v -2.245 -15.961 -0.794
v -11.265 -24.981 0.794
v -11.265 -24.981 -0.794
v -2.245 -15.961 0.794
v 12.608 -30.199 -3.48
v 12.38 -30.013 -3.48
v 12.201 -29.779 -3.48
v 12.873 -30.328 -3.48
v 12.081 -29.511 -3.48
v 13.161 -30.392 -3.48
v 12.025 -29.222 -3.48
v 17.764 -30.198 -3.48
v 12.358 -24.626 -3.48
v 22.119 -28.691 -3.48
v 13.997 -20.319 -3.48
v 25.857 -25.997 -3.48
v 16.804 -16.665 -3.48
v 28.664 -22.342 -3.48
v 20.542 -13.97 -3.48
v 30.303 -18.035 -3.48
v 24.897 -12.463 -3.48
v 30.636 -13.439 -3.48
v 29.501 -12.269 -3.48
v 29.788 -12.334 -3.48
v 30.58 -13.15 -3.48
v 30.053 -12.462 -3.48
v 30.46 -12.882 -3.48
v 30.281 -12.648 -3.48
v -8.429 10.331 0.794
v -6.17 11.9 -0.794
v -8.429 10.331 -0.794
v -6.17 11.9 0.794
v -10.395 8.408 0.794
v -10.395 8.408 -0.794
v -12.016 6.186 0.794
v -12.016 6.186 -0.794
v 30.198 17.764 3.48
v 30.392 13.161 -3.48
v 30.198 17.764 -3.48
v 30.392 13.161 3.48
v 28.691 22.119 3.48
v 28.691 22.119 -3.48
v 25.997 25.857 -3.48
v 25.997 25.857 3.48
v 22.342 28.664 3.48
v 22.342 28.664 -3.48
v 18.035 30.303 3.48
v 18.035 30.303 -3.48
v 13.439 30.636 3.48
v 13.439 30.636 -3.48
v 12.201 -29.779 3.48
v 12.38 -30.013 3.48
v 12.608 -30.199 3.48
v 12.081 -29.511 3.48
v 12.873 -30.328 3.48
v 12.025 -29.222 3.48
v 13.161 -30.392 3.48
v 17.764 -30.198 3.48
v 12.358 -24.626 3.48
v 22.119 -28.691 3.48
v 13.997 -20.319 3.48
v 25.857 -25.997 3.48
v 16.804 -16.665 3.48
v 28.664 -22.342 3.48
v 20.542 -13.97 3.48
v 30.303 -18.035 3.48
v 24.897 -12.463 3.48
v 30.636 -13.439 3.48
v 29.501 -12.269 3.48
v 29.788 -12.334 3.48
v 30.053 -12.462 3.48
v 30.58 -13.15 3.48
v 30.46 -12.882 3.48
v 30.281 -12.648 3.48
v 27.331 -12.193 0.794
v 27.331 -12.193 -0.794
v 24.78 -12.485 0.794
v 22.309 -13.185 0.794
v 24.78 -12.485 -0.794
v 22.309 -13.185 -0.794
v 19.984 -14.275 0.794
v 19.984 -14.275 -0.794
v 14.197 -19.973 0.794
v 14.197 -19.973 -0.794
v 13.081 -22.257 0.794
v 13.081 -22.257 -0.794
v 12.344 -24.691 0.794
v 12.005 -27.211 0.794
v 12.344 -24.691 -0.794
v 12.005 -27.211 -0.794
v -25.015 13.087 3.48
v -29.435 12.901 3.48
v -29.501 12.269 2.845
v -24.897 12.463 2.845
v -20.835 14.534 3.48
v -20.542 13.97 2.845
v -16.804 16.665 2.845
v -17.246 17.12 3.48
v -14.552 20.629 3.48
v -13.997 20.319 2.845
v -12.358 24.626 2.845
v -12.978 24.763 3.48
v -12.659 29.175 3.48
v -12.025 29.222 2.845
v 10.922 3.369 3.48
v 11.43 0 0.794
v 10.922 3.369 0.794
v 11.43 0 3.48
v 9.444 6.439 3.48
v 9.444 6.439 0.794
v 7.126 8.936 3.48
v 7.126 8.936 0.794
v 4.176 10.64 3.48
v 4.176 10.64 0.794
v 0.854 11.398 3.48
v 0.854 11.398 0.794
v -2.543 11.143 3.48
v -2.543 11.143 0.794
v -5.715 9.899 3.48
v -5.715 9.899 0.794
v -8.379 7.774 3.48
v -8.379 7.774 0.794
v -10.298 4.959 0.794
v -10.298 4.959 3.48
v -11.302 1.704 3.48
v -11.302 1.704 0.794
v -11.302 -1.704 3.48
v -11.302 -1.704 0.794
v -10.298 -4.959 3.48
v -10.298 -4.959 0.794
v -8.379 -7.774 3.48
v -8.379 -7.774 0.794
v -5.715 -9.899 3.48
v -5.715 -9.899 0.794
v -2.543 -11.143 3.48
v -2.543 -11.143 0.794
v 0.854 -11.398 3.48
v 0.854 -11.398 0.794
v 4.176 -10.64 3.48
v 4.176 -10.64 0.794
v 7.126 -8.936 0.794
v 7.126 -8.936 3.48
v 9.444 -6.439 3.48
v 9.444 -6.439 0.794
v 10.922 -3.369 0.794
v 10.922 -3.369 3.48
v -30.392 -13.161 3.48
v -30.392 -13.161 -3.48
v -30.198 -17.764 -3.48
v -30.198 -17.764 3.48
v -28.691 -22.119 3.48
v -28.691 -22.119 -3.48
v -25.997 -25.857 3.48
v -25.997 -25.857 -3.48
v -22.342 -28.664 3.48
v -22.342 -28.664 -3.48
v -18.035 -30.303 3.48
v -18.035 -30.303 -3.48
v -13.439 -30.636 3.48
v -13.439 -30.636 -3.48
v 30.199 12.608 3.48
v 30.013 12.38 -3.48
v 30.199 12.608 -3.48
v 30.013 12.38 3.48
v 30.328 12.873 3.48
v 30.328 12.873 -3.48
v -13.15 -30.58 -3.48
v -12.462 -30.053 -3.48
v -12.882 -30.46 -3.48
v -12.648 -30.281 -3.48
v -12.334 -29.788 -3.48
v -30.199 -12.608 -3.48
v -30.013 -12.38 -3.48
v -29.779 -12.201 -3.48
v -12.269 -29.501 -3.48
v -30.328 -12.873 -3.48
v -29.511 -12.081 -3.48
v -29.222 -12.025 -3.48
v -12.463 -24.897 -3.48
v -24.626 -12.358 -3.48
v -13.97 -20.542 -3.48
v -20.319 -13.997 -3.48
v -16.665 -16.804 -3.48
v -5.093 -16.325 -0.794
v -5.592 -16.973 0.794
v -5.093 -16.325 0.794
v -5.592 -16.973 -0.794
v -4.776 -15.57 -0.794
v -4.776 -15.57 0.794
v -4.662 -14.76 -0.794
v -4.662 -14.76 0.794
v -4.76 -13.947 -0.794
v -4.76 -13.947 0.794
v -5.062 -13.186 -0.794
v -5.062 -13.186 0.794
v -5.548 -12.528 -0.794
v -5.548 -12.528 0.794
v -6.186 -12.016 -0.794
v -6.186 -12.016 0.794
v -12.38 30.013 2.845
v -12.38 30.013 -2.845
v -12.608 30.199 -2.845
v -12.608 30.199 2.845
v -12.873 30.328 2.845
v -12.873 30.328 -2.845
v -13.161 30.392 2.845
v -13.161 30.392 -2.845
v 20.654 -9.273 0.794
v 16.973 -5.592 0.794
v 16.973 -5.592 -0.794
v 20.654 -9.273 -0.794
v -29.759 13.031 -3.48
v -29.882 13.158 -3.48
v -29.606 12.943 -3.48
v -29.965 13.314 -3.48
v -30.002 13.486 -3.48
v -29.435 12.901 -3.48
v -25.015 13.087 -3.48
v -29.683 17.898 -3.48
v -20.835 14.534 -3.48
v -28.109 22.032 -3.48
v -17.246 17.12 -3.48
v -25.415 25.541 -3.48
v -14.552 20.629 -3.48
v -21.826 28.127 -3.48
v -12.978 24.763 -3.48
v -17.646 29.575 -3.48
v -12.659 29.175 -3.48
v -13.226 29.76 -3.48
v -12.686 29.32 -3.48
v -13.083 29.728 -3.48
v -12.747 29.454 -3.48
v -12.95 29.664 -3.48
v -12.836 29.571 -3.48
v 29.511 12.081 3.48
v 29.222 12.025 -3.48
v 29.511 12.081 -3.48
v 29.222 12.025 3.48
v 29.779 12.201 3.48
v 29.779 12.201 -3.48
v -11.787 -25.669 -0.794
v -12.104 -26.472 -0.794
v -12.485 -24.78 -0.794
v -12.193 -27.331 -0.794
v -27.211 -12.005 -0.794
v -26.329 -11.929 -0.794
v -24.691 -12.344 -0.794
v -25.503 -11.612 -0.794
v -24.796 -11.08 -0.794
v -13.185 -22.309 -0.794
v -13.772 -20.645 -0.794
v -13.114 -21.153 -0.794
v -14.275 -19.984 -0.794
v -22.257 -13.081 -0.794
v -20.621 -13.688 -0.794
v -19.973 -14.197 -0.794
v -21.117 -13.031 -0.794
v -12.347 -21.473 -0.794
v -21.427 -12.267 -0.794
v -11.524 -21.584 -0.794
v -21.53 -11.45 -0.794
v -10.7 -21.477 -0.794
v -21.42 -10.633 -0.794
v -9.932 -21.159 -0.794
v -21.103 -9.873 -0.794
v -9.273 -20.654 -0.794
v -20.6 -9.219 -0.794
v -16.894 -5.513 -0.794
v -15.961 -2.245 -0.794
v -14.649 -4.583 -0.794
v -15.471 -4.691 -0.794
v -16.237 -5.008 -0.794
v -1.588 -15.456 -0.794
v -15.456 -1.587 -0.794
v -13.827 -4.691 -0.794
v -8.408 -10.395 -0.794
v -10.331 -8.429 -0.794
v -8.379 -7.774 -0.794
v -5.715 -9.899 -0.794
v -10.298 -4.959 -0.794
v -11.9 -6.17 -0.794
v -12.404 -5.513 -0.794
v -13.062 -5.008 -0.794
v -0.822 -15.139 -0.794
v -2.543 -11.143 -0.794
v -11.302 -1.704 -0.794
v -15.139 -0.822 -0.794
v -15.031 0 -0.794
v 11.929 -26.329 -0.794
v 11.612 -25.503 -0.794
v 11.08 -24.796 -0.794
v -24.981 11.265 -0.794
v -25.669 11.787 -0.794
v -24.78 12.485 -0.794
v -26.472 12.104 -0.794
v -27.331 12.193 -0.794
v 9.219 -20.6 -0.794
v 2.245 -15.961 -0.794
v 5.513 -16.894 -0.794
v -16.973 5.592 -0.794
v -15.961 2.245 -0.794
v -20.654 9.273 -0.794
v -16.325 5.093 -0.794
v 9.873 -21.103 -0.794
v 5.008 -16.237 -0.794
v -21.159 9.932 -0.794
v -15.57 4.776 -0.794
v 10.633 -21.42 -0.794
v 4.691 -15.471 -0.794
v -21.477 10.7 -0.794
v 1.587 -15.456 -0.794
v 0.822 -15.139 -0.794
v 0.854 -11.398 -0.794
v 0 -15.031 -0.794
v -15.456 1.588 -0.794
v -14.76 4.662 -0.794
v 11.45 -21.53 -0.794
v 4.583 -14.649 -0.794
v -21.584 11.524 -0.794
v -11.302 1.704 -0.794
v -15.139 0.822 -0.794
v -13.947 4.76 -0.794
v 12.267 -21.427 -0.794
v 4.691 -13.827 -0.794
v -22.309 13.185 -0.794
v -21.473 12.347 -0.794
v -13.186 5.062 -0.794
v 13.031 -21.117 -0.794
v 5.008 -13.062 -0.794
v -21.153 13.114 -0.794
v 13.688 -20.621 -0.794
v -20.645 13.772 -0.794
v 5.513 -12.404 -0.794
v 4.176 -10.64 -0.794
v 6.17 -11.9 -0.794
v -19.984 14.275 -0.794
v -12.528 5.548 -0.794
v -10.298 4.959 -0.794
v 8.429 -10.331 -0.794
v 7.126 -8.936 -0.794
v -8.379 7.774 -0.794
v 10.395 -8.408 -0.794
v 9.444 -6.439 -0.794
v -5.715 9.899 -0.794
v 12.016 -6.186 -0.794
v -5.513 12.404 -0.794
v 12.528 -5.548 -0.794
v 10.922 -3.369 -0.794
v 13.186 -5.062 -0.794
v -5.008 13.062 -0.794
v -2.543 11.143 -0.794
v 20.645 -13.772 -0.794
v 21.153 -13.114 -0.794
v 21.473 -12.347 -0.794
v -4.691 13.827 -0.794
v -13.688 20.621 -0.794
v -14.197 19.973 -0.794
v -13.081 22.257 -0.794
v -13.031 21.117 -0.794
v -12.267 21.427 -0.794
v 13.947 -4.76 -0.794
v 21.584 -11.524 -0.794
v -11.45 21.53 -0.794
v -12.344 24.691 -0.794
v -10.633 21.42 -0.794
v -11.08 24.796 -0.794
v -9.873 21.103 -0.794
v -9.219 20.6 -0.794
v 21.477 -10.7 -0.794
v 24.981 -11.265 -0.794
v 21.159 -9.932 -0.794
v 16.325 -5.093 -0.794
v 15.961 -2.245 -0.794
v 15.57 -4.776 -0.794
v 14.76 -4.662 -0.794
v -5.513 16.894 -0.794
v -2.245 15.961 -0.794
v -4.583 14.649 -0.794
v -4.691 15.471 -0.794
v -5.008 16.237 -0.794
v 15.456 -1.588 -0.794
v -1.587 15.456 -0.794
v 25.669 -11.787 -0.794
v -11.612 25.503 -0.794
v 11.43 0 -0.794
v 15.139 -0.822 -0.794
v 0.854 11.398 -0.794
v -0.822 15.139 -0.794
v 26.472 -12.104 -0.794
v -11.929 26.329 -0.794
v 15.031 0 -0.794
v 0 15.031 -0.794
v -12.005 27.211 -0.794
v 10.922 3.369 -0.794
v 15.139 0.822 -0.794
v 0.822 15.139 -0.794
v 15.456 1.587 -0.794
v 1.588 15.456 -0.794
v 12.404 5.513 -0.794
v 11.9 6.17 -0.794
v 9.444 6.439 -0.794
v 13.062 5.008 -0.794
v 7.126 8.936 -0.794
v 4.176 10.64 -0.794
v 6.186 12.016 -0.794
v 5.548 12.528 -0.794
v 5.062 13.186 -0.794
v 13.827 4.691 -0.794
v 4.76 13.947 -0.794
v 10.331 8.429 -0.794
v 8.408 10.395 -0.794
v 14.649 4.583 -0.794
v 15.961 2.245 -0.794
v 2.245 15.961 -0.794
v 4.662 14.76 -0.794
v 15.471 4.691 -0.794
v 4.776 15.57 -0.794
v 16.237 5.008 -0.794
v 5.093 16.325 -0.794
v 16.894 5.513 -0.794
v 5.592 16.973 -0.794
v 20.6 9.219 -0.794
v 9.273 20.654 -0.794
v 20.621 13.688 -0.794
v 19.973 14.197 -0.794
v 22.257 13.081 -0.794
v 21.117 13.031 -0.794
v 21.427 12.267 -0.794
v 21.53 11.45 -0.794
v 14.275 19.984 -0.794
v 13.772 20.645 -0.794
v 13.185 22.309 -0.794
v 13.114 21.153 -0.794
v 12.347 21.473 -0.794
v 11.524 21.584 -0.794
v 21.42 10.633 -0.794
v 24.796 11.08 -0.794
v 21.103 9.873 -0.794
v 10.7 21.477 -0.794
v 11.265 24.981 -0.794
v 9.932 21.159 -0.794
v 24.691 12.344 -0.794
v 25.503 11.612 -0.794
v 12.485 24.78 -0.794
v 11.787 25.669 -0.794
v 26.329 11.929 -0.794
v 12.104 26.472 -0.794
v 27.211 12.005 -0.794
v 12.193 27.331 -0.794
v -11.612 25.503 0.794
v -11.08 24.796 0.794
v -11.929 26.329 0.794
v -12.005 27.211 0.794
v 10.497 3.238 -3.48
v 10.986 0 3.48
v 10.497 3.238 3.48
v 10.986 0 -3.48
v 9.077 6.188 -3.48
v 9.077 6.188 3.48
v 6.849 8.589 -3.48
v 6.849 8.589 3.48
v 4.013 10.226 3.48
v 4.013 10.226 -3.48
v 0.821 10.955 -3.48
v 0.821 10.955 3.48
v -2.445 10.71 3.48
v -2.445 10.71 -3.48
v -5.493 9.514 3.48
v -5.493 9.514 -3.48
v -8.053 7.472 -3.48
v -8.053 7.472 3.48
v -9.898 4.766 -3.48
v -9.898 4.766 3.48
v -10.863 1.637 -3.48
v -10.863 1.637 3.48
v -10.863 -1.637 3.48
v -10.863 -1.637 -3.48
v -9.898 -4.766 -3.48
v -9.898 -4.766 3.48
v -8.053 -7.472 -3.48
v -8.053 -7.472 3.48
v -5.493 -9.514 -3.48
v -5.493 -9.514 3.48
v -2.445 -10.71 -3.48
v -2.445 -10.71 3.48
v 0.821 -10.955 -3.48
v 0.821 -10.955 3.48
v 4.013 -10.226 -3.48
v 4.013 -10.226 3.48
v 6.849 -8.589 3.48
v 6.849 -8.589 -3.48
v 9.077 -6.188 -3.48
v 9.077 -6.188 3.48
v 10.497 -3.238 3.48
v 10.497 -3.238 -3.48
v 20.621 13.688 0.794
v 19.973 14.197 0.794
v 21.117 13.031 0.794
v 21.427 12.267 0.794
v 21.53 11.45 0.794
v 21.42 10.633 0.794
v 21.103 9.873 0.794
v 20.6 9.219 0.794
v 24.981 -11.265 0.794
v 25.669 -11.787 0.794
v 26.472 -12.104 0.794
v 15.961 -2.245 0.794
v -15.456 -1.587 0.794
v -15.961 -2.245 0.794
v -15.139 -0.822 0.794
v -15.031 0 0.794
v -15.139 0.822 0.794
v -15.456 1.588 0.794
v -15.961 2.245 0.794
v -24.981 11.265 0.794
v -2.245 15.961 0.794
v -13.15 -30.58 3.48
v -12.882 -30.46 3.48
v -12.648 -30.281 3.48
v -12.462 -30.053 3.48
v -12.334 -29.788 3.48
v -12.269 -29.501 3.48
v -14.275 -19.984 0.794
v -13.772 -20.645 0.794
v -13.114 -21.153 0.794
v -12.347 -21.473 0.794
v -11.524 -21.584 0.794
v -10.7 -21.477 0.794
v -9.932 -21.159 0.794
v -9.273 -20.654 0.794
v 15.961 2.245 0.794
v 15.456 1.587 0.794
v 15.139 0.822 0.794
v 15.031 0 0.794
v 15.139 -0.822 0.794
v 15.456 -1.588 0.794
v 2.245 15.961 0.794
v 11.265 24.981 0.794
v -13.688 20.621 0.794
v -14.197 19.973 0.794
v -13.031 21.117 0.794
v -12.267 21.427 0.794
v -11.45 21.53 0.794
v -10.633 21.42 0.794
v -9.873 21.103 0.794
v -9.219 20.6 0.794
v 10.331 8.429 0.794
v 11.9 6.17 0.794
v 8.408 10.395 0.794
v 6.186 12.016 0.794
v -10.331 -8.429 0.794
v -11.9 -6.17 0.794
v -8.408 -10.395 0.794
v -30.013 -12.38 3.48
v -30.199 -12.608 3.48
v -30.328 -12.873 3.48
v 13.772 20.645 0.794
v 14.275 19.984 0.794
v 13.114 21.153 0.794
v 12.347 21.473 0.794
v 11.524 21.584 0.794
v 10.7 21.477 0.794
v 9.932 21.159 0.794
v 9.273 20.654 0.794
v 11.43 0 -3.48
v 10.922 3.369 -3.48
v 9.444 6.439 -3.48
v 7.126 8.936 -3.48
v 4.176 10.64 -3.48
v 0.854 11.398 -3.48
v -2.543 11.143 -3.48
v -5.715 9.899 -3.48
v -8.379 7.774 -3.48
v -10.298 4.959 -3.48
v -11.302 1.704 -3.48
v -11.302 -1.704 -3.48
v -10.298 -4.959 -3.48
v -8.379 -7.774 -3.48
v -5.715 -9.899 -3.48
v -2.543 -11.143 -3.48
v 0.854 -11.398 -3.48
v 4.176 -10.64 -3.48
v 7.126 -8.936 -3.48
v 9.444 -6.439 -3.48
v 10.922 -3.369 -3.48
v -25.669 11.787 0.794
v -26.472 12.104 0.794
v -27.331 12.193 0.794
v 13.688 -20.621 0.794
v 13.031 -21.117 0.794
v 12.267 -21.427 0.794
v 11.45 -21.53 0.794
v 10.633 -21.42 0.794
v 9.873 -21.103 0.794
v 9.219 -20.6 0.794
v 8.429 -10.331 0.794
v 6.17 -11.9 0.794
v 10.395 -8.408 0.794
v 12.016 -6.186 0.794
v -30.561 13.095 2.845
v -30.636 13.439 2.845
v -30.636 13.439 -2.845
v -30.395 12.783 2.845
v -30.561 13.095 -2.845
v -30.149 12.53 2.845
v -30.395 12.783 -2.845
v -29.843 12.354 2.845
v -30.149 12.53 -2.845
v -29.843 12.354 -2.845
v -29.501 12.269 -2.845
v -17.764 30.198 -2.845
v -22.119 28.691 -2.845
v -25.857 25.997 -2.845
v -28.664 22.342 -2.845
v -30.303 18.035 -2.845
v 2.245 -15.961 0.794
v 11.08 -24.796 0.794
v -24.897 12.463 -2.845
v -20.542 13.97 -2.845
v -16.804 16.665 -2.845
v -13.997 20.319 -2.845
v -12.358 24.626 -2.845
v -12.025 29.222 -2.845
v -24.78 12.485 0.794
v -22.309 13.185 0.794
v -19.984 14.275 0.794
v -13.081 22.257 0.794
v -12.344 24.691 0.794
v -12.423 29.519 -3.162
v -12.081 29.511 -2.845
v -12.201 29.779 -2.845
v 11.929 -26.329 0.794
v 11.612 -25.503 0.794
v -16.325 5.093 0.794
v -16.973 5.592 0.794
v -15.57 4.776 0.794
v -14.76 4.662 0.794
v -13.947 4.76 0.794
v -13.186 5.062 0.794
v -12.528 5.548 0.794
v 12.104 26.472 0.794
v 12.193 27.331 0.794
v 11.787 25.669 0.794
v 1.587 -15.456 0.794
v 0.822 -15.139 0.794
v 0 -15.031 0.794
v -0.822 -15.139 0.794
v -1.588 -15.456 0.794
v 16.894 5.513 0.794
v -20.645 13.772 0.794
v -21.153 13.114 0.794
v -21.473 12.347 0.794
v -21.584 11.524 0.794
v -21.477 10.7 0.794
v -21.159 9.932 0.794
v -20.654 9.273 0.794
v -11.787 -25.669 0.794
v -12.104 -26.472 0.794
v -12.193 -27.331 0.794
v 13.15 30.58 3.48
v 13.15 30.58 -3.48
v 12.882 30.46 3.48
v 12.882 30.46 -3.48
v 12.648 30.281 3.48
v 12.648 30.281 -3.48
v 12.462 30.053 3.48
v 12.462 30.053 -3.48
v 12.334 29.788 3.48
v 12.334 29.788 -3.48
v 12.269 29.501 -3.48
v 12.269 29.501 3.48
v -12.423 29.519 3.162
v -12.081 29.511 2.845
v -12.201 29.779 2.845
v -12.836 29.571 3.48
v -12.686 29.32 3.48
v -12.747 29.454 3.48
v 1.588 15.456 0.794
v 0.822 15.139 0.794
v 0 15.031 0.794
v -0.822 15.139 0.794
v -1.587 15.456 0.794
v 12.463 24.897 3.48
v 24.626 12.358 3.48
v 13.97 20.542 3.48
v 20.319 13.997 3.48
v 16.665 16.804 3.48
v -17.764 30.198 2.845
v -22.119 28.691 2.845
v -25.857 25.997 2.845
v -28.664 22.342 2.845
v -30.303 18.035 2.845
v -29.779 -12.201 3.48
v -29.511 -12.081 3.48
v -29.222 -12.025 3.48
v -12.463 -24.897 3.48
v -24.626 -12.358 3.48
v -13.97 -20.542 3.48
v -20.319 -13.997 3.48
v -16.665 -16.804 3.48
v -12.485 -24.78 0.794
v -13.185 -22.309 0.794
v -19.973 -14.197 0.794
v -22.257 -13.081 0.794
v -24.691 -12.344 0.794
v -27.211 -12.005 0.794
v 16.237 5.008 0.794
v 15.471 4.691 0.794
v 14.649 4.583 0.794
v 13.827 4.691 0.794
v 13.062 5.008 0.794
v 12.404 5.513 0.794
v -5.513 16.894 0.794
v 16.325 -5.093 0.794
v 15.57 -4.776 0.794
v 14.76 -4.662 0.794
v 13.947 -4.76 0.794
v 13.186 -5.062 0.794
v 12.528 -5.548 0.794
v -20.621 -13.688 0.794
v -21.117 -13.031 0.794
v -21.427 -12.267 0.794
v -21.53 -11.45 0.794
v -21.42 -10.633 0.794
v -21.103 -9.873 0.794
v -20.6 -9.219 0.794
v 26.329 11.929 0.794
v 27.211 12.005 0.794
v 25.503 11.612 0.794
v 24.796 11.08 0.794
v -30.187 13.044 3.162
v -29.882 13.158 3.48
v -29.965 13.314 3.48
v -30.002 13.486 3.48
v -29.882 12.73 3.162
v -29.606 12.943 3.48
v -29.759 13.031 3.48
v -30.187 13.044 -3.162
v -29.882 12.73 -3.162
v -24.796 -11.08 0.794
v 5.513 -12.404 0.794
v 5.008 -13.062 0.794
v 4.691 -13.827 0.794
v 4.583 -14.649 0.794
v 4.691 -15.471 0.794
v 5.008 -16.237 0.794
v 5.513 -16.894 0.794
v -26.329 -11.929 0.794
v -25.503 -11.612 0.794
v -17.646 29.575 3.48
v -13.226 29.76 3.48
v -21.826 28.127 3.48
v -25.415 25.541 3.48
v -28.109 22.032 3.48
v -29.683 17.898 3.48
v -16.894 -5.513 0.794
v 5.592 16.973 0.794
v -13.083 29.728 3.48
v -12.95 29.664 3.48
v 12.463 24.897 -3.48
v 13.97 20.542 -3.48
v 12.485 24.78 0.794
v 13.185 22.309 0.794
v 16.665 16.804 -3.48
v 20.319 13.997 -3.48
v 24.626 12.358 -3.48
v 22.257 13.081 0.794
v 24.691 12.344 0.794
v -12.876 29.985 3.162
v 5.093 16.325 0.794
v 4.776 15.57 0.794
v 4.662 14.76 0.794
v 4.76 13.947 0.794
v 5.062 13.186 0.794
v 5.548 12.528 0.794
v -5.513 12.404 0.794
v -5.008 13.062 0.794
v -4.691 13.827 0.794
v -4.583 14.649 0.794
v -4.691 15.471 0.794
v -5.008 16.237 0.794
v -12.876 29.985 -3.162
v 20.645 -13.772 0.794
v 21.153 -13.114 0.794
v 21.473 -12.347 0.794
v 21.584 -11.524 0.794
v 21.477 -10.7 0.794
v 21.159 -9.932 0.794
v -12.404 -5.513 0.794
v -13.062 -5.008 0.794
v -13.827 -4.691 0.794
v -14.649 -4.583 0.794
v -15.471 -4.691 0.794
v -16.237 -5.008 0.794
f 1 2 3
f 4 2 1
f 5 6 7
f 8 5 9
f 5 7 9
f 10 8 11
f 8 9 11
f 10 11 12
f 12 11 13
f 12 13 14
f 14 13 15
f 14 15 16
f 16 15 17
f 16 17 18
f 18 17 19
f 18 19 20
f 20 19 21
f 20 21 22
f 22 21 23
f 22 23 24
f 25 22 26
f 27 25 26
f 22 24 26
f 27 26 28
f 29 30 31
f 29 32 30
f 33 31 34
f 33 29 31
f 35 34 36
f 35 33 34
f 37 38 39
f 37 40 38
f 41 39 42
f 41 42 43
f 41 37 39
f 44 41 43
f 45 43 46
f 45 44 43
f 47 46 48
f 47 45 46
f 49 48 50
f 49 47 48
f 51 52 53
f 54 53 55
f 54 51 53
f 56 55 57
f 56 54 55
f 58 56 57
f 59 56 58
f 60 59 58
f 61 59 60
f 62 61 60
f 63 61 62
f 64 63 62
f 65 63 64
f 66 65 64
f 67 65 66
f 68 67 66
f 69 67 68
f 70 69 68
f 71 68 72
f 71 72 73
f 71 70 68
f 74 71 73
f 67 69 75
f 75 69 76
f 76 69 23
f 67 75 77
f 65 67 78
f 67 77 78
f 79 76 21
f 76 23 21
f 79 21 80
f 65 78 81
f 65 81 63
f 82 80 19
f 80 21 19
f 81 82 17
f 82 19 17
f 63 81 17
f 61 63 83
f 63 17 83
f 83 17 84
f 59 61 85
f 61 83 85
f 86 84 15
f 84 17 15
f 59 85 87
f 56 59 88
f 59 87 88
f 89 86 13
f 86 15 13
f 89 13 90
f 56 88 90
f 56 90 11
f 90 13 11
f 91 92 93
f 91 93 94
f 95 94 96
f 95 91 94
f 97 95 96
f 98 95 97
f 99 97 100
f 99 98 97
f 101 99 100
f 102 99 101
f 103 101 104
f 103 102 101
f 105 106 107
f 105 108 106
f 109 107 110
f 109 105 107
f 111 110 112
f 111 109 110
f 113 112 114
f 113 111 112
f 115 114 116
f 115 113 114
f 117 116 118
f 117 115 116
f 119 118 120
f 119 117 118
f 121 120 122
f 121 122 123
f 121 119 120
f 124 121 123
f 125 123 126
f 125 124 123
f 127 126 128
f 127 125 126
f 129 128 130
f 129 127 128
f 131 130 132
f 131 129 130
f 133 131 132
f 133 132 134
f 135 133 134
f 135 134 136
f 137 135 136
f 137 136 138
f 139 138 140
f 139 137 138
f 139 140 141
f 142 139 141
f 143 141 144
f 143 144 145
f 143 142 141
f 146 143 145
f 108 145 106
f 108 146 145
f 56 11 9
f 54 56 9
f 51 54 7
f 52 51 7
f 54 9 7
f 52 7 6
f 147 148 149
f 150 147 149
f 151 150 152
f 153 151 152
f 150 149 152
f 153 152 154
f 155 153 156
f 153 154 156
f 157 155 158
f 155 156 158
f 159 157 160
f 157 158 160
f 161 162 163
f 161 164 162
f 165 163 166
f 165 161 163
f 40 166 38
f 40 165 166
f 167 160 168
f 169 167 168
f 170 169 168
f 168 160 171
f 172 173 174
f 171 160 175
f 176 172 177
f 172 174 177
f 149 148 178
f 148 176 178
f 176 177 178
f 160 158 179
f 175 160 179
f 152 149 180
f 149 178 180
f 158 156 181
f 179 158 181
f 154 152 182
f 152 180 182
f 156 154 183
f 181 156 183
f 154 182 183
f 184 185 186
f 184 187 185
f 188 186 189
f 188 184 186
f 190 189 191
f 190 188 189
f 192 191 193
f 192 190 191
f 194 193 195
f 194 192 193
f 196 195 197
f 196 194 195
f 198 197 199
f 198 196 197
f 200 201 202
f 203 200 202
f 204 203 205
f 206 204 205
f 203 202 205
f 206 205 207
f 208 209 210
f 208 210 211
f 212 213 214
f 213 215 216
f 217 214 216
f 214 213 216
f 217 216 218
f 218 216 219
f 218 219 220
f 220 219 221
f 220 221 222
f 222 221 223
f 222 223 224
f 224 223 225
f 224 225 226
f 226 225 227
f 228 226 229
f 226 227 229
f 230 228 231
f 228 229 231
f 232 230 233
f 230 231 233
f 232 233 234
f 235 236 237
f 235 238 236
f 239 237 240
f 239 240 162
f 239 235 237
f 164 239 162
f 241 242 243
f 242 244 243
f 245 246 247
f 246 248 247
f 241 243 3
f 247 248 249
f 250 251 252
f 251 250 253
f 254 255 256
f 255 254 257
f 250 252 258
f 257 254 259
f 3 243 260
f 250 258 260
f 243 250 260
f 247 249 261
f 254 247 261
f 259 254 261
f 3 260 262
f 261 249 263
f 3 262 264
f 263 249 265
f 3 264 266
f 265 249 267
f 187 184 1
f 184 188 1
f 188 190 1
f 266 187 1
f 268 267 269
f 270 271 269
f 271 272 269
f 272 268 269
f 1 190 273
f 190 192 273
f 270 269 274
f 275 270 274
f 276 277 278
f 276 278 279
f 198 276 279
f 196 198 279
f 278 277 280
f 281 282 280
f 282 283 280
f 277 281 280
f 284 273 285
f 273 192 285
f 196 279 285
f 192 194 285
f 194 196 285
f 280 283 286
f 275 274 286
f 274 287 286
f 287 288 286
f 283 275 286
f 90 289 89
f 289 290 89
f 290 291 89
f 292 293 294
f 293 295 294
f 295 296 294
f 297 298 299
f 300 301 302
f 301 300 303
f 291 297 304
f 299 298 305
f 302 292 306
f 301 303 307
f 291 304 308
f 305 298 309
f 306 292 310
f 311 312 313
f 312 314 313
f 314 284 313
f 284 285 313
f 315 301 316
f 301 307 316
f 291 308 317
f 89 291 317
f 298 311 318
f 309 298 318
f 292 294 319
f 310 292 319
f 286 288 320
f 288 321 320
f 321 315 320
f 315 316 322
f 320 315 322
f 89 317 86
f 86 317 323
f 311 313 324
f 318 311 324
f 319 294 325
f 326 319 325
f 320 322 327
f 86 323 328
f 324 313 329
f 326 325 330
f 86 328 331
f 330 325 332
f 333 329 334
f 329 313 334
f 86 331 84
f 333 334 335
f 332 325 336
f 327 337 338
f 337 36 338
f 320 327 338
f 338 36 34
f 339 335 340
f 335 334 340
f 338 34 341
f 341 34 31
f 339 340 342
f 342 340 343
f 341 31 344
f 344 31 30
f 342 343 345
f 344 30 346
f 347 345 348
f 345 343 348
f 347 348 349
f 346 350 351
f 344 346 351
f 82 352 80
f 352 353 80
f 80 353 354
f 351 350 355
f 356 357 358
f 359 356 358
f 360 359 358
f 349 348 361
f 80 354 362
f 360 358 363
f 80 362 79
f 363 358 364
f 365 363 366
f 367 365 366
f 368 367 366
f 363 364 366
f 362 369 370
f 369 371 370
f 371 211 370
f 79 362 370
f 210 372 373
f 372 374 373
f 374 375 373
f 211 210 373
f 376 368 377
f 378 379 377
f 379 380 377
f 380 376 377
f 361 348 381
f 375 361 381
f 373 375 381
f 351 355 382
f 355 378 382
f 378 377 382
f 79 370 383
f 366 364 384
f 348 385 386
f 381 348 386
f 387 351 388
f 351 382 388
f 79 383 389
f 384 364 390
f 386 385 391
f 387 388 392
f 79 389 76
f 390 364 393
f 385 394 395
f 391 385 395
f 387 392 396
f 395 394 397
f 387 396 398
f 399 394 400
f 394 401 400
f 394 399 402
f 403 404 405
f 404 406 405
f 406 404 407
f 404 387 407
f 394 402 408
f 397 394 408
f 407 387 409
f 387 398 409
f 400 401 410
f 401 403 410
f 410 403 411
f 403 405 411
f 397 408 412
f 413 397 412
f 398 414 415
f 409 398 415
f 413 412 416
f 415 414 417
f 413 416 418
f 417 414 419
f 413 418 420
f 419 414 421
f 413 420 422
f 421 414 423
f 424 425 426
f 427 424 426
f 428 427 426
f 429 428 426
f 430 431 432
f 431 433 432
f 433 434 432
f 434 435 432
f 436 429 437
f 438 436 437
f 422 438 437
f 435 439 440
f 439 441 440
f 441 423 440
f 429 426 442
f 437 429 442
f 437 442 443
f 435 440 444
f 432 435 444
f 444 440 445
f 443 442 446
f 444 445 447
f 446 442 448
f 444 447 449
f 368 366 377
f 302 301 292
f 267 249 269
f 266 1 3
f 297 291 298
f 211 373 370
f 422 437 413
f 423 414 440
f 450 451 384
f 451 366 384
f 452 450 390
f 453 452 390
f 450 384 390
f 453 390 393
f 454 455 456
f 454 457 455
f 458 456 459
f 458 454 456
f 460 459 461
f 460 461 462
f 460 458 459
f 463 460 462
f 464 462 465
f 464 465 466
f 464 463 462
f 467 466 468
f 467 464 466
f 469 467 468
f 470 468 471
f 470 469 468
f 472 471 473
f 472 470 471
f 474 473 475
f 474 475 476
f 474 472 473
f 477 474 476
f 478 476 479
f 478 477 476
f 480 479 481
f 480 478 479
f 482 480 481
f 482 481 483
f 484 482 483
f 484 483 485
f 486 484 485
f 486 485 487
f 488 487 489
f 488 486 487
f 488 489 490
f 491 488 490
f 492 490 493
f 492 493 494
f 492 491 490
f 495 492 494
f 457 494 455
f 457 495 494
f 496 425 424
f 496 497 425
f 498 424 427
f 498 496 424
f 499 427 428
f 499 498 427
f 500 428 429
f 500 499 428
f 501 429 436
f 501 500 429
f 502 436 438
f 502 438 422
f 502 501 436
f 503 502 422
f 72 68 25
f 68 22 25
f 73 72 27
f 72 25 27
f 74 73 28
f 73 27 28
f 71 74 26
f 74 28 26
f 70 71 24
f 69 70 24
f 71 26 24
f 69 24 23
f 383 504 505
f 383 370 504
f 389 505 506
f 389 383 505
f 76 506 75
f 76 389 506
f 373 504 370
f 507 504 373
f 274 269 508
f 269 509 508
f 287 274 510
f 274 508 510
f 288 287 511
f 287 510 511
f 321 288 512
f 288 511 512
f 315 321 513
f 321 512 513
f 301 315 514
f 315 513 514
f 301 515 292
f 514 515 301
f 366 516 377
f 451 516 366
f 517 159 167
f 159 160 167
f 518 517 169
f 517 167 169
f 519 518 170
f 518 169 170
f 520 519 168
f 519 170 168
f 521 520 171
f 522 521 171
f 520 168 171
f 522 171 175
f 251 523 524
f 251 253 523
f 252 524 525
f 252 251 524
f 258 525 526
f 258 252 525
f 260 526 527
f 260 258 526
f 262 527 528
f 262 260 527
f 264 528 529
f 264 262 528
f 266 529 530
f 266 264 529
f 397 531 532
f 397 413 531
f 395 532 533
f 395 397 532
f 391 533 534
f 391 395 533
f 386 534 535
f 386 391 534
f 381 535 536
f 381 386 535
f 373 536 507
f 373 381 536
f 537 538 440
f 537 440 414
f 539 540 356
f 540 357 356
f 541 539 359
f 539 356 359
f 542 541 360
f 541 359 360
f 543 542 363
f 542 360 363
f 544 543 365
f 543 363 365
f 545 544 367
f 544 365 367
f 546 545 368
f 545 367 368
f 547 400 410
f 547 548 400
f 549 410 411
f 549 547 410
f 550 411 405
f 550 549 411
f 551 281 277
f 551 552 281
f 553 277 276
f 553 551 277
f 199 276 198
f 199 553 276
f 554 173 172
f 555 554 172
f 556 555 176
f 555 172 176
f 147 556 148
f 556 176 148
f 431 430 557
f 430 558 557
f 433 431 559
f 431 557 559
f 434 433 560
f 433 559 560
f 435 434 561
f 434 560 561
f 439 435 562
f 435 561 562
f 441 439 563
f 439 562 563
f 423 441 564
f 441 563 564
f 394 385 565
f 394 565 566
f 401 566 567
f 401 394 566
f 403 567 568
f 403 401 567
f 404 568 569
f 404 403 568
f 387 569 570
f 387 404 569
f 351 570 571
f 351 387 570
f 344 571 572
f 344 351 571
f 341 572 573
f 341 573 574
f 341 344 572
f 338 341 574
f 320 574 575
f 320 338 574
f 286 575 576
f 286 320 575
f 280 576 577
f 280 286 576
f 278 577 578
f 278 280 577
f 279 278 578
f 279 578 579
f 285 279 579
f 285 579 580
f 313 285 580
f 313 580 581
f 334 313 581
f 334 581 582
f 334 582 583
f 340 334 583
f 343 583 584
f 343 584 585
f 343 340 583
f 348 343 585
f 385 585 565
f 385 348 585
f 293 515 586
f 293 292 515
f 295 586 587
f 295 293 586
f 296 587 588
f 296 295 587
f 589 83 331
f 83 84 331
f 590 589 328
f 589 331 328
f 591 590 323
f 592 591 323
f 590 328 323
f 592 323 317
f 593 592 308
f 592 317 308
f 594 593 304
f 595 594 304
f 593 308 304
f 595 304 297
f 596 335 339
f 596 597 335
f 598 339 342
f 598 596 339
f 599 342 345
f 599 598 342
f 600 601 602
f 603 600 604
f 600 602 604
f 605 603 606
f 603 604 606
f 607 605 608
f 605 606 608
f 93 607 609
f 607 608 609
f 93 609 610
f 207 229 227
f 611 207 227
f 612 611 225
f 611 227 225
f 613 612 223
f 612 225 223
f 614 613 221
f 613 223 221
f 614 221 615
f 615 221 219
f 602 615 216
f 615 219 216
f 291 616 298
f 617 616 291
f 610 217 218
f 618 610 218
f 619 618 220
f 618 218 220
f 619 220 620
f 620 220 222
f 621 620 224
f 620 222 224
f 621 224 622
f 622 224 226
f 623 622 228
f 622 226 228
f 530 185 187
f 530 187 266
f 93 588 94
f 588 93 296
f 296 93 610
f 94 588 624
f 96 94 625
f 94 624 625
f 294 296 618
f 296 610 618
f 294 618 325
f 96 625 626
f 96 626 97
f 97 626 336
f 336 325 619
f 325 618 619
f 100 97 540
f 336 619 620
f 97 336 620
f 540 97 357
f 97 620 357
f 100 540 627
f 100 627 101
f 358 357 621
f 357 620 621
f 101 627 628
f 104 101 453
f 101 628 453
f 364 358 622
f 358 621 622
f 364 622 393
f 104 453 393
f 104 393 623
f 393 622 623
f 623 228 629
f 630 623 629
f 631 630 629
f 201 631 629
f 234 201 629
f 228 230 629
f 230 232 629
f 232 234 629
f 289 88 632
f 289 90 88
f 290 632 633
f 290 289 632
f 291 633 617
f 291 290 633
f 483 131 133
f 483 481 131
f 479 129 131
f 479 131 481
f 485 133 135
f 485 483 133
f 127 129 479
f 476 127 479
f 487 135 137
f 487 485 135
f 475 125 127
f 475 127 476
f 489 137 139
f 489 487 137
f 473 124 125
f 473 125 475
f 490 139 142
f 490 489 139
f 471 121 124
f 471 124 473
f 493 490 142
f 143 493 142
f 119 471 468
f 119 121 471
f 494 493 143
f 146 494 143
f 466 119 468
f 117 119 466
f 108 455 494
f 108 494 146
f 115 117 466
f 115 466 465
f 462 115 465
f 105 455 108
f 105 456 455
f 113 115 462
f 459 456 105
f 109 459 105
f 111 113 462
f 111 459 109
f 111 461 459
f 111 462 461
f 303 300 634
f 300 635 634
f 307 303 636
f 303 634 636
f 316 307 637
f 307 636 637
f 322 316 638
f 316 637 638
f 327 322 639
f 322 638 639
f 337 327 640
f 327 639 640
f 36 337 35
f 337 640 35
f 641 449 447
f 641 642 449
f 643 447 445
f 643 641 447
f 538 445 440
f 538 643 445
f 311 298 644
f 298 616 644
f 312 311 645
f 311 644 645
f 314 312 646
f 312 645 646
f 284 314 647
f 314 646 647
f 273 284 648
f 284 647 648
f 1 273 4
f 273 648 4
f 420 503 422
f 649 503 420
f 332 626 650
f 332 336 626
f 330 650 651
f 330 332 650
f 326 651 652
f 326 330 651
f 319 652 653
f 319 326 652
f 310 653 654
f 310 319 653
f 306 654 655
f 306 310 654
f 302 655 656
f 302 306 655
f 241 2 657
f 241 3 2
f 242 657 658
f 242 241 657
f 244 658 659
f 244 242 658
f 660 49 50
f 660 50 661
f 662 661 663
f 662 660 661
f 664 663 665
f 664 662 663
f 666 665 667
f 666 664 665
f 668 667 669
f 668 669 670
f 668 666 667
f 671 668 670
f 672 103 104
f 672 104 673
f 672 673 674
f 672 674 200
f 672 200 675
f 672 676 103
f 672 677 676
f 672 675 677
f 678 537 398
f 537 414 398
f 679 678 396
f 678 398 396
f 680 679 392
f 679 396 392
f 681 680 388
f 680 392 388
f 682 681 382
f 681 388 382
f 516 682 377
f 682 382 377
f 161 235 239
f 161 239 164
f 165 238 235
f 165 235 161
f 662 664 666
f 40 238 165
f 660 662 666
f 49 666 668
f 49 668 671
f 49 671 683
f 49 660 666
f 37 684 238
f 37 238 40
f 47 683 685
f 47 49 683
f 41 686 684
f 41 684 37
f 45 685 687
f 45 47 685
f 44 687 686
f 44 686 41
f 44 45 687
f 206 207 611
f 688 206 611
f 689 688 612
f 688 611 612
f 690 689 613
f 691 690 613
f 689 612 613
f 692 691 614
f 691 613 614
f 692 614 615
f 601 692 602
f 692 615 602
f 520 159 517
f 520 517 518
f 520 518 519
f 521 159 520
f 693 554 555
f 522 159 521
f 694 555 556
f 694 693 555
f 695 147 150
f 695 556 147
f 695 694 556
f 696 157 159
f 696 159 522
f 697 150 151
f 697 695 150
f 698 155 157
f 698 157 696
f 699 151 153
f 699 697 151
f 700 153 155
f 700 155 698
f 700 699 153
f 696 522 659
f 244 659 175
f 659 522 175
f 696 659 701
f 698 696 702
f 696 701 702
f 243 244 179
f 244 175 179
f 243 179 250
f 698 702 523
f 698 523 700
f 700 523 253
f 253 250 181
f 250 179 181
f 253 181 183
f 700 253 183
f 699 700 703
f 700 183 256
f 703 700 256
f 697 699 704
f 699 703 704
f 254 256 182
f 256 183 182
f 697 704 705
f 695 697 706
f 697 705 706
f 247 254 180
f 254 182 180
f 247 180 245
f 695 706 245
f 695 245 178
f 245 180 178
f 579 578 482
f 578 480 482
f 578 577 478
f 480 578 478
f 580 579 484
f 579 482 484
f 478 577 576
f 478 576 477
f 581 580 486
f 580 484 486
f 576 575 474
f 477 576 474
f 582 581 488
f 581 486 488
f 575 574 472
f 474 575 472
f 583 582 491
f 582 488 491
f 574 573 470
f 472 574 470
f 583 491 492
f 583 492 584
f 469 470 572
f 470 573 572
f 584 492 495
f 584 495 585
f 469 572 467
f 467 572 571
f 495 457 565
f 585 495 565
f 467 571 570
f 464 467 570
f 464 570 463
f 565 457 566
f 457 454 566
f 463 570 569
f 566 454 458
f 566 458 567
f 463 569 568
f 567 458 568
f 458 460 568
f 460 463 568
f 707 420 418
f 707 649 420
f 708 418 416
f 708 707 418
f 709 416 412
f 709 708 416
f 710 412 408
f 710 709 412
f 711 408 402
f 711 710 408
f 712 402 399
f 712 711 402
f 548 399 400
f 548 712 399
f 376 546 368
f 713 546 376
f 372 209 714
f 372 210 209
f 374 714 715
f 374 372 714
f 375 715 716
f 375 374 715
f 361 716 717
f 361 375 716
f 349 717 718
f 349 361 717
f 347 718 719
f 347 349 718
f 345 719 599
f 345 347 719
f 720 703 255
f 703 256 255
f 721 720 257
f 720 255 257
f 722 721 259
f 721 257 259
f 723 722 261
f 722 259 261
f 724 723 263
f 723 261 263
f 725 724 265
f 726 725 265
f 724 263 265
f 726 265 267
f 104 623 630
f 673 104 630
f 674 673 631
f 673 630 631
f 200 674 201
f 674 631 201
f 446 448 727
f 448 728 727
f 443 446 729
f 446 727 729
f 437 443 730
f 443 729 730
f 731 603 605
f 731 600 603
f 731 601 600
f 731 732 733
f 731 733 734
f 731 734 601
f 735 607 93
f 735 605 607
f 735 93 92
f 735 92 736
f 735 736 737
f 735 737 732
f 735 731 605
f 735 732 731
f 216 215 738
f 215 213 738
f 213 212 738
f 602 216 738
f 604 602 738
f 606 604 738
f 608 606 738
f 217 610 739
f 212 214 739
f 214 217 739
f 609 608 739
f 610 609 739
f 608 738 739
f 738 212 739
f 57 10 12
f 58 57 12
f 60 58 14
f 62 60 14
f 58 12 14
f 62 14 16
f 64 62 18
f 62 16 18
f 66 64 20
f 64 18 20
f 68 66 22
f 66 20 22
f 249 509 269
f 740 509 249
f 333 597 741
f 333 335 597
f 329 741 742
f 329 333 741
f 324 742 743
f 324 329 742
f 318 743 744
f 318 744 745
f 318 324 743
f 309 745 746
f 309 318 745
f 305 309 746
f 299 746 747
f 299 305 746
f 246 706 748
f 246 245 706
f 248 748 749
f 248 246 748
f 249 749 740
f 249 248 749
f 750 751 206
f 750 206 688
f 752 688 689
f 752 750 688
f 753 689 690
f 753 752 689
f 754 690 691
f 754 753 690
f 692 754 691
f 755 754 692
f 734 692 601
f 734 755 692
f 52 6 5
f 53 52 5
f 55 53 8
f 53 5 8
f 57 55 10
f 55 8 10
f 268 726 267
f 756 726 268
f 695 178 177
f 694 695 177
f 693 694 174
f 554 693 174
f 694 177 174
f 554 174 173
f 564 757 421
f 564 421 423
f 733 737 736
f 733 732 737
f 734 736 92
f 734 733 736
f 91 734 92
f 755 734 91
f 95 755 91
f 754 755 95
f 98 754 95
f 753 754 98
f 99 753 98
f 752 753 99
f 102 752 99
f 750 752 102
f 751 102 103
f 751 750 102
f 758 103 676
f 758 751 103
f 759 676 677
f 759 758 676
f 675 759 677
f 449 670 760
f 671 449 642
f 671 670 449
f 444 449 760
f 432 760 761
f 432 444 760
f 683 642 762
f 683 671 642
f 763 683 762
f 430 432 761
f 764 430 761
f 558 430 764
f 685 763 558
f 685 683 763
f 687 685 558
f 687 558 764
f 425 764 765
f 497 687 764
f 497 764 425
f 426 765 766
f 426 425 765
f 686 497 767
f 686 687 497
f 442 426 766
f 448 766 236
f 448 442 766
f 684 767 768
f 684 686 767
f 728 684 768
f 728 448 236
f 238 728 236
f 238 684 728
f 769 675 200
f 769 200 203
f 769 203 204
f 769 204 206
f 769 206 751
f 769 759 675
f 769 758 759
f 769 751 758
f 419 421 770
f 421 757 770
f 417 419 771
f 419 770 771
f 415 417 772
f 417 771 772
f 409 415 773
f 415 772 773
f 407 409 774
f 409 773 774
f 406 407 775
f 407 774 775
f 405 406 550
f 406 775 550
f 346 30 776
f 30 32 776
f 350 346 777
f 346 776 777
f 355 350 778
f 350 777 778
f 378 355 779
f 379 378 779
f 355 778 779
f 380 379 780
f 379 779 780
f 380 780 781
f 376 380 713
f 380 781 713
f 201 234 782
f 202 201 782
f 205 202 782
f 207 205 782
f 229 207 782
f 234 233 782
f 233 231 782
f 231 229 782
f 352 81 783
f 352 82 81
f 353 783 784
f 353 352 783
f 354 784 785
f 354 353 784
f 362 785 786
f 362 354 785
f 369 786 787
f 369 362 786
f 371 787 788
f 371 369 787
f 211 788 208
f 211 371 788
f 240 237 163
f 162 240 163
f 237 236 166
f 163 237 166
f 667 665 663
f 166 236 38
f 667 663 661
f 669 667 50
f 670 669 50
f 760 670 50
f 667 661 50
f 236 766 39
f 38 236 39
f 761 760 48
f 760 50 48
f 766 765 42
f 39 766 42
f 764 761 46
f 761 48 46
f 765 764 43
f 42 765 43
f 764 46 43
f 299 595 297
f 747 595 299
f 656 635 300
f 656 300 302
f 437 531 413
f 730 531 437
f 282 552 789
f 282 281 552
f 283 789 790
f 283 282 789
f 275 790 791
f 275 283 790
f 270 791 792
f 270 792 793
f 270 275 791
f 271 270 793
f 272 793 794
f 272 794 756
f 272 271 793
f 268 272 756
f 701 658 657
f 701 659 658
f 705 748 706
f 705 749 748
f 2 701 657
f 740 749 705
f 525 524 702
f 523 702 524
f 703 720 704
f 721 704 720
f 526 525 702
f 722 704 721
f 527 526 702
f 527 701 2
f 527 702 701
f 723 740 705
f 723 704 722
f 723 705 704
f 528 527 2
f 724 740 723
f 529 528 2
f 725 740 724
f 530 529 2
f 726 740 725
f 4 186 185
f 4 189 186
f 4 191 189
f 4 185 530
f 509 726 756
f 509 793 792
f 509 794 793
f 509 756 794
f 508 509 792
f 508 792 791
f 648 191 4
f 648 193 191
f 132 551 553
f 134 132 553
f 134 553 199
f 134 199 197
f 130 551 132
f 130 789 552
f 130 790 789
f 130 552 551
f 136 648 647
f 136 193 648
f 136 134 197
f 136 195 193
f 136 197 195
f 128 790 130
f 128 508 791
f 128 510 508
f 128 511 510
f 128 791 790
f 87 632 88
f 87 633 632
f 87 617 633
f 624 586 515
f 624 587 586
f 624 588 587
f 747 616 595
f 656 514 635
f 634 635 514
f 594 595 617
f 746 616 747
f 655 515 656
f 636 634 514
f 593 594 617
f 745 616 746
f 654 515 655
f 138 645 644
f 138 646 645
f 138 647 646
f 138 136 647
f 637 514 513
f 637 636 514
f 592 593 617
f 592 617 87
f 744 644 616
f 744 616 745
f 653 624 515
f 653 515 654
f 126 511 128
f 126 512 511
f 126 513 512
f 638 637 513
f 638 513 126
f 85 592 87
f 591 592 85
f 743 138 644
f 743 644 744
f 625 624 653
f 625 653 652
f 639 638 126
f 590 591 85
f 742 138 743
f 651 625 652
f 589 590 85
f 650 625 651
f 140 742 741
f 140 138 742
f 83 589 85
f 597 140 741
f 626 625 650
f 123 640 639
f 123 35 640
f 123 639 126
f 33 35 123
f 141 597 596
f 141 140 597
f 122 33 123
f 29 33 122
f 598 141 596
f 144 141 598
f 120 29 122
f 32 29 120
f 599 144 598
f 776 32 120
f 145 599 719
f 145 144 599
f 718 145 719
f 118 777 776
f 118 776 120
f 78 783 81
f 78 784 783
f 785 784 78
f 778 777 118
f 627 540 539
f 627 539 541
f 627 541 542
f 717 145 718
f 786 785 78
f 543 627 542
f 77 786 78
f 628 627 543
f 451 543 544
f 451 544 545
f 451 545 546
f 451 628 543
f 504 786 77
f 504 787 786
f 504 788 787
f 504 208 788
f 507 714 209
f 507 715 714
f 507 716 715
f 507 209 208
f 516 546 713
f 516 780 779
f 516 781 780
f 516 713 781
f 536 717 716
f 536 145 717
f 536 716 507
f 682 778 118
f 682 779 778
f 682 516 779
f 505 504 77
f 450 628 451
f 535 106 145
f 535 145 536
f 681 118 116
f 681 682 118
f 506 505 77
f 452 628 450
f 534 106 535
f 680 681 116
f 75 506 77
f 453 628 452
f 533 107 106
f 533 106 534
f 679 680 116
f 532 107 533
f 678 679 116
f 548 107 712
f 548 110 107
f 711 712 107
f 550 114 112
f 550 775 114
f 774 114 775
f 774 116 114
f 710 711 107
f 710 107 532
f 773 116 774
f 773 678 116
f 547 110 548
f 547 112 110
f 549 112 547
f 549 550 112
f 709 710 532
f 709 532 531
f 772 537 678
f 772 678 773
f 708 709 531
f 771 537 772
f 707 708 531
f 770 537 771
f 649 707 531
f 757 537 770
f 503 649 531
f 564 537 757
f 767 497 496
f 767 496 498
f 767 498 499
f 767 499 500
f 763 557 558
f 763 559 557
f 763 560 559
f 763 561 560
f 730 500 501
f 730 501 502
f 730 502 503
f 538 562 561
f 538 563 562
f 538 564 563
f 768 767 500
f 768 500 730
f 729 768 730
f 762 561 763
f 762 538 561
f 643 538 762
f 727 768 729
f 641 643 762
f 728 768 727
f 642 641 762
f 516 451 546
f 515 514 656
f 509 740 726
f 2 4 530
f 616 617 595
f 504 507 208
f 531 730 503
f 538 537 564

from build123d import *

# Parameters (mm, degrees)
F0_R     = 11.43
F1_DEPTH = 0.79375
F2_R     = 11.43
F2_R_2   = 10.9855
F3_DEPTH = 3.4798
F5_DEPTH = 3.4798
F6_R     = 3.175
F7_SIZE  = 0.635


# Not quite as in the source:
# - a feature names something its author has since deleted; it is built from what else it names


with BuildPart() as f1:
    # F0 (on Top) → F1 (new body, symmetric)
    with BuildSketch(Plane.XY):
        Polygon((-14.3684097937, 28.0844097937), (-28.2927262655, 14.5767262655), (-13.716, 0), (-28.0844097937, -14.3684097937), (-14.5767262655, -28.2927262655), (0, -13.716), (14.3684097937, -28.0844097937), (28.2927262655, -14.5767262655), (13.716, 0), (28.0844097937, 14.3684097937), (14.5767262655, 28.2927262655), (0, 13.716), align=None)
        with BuildLine():
            ThreePointArc((-13.0320412256, -24.4131746341), (-20.1396997698, -20.0947125947), (-24.2403197525, -12.8591863439))
            Line((-24.2403197525, -12.8591863439), (-13.5538149684, -2.1726815599))
            ThreePointArc((-13.5538149684, -2.1726815599), (-9.4531949857, -9.4082078106), (-2.3455364415, -13.72666985))
            Line((-2.3455364415, -13.72666985), (-13.0320412256, -24.4131746341))
        make_face(mode=Mode.SUBTRACT)
        with BuildLine():
            ThreePointArc((24.4131746341, -13.0320412256), (20.0947125947, -20.1396997698), (12.8591863439, -24.2403197525))
            Line((12.8591863439, -24.2403197525), (2.1726815599, -13.5538149684))
            ThreePointArc((2.1726815599, -13.5538149684), (9.4082078106, -9.4531949857), (13.72666985, -2.3455364415))
            Line((13.72666985, -2.3455364415), (24.4131746341, -13.0320412256))
        make_face(mode=Mode.SUBTRACT)
        Circle(F0_R, mode=Mode.SUBTRACT)
        with BuildLine():
            ThreePointArc((-2.1726815599, 13.5538149684), (-9.4082078106, 9.4531949857), (-13.72666985, 2.3455364415))
            Line((-13.72666985, 2.3455364415), (-24.4131746341, 13.0320412256))
            ThreePointArc((-24.4131746341, 13.0320412256), (-20.0947125947, 20.1396997698), (-12.8591863439, 24.2403197525))
            Line((-12.8591863439, 24.2403197525), (-2.1726815599, 13.5538149684))
        make_face(mode=Mode.SUBTRACT)
        with BuildLine():
            ThreePointArc((13.0320412256, 24.4131746341), (20.1396997698, 20.0947125947), (24.2403197525, 12.8591863439))
            Line((24.2403197525, 12.8591863439), (13.5538149684, 2.1726815599))
            ThreePointArc((13.5538149684, 2.1726815599), (9.4531949857, 9.4082078106), (2.3455364415, 13.72666985))
            Line((2.3455364415, 13.72666985), (13.0320412256, 24.4131746341))
        make_face(mode=Mode.SUBTRACT)
    extrude(amount=F1_DEPTH, both=True)

    # F2 (on Top) → F3 (join, symmetric)
    with BuildSketch(Plane.XY):
        Circle(F2_R)
        Circle(F2_R_2, mode=Mode.SUBTRACT)
    extrude(amount=F3_DEPTH, both=True)

    # F4 (on Top) → F5 (join, symmetric)
    with BuildSketch(Plane.XY):
        with BuildLine():
            ThreePointArc((-13.1605476158, 30.3918186243), (-25.856934394, 25.9965462925), (-30.6357520227, 13.4394941638))
            ThreePointArc((-30.6357520227, 13.4394941638), (-30.5278746276, 13.0126091951), (-30.2807216131, 12.6482142222))
            Line((-30.2807216131, 12.6482142222), (-12.3804144461, 30.0129218371))
            ThreePointArc((-12.3804144461, 30.0129218371), (-12.7371356357, 30.2710270515), (-13.1605476158, 30.3918186243))
        make_face()
        with BuildLine():
            Line((-12.3804144461, 30.0129218371), (-30.2807216131, 12.6482142222))
            ThreePointArc((-30.2807216131, 12.6482142222), (-29.9240004235, 12.3901090077), (-29.5005884435, 12.2693174349))
            ThreePointArc((-29.5005884435, 12.2693174349), (-16.8042016652, 16.6645897667), (-12.0253840365, 29.2216418954))
            ThreePointArc((-12.0253840365, 29.2216418954), (-12.1332614316, 29.6485268641), (-12.3804144461, 30.0129218371))
        make_face()
        with BuildLine():
            ThreePointArc((-30.3918186243, -13.1605476158), (-25.9965462925, -25.856934394), (-13.4394941638, -30.6357520227))
            ThreePointArc((-13.4394941638, -30.6357520227), (-13.0126091951, -30.5278746276), (-12.6482142222, -30.2807216131))
            Line((-12.6482142222, -30.2807216131), (-30.0129218371, -12.3804144461))
            ThreePointArc((-30.0129218371, -12.3804144461), (-30.2710270515, -12.7371356357), (-30.3918186243, -13.1605476158))
        make_face()
        with BuildLine():
            Line((-30.0129218371, -12.3804144461), (-12.6482142222, -30.2807216131))
            ThreePointArc((-12.6482142222, -30.2807216131), (-12.3901090077, -29.9240004235), (-12.2693174349, -29.5005884435))
            ThreePointArc((-12.2693174349, -29.5005884435), (-16.6645897667, -16.8042016652), (-29.2216418954, -12.0253840365))
            ThreePointArc((-29.2216418954, -12.0253840365), (-29.6485268641, -12.1332614316), (-30.0129218371, -12.3804144461))
        make_face()
        with BuildLine():
            ThreePointArc((13.1605476158, -30.3918186243), (25.856934394, -25.9965462925), (30.6357520227, -13.4394941638))
            ThreePointArc((30.6357520227, -13.4394941638), (30.5278746276, -13.0126091951), (30.2807216131, -12.6482142222))
            Line((30.2807216131, -12.6482142222), (12.3804144461, -30.0129218371))
            ThreePointArc((12.3804144461, -30.0129218371), (12.7371356357, -30.2710270515), (13.1605476158, -30.3918186243))
        make_face()
        with BuildLine():
            Line((12.3804144461, -30.0129218371), (30.2807216131, -12.6482142222))
            ThreePointArc((30.2807216131, -12.6482142222), (29.9240004235, -12.3901090077), (29.5005884435, -12.2693174349))
            ThreePointArc((29.5005884435, -12.2693174349), (16.8042016652, -16.6645897667), (12.0253840365, -29.2216418954))
            ThreePointArc((12.0253840365, -29.2216418954), (12.1332614316, -29.6485268641), (12.3804144461, -30.0129218371))
        make_face()
        with BuildLine():
            ThreePointArc((30.3918186243, 13.1605476158), (25.9965462925, 25.856934394), (13.4394941638, 30.6357520227))
            ThreePointArc((13.4394941638, 30.6357520227), (13.0126091951, 30.5278746276), (12.6482142222, 30.2807216131))
            Line((12.6482142222, 30.2807216131), (30.0129218371, 12.3804144461))
            ThreePointArc((30.0129218371, 12.3804144461), (30.2710270515, 12.7371356357), (30.3918186243, 13.1605476158))
        make_face()
        with BuildLine():
            Line((30.0129218371, 12.3804144461), (12.6482142222, 30.2807216131))
            ThreePointArc((12.6482142222, 30.2807216131), (12.3901090077, 29.9240004235), (12.2693174349, 29.5005884435))
            ThreePointArc((12.2693174349, 29.5005884435), (16.6645897667, 16.8042016652), (29.2216418954, 12.0253840365))
            ThreePointArc((29.2216418954, 12.0253840365), (29.6485268641, 12.1332614316), (30.0129218371, 12.3804144461))
        make_face()
    extrude(amount=F5_DEPTH, both=True)

    # F6
    f6_edges = [f1.edges().sort_by_distance(p)[0] for p in [
        (-26.008197, 12.292197, 0),
        (-12.533339, 23.914473, 0),
        (-24.032883, 12.65175, 0),
        (-12.136817, 25.852817, 0),
        (-2.172682, 13.553815, 0),
        (-13.72667, 2.345536, 0),
        (-13.716, 0, 0),
        (0, 13.716, 0),
        (2.345536, 13.72667, 0),
        (13.553815, 2.172682, 0),
        (13.716, 0, 0),
        (13.72667, -2.345536, 0),
        (2.172682, -13.553815, 0),
        (0, -13.716, 0),
        (-2.345536, -13.72667, 0),
        (-13.553815, -2.172682, 0),
        (12.292197, 26.008197, 0),
        (12.65175, 24.032883, 0),
        (25.852817, 12.136817, 0),
        (23.914473, 12.533339, 0),
        (26.008197, -12.292197, 0),
        (24.032883, -12.65175, 0),
        (12.136817, -25.852817, 0),
        (12.533339, -23.914473, 0),
        (-12.292197, -26.008197, 0),
        (-12.65175, -24.032883, 0),
        (-25.852817, -12.136817, 0),
        (-23.914473, -12.533339, 0),
    ]]
    fillet(f6_edges, radius=F6_R)

    # F7
    f7_edges = [f1.edges().sort_by_distance(p)[0] for p in [
        (-25.856934, 25.996546, 3.4798),
        (-30.280722, 12.648214, 3.4798),
        (-16.804202, 16.66459, 3.4798),
        (-12.380414, 30.012922, 3.4798),
        (-25.856934, 25.996546, -3.4798),
        (-30.280722, 12.648214, -3.4798),
        (-16.804202, 16.66459, -3.4798),
        (-12.380414, 30.012922, -3.4798),
    ]]
    chamfer(f7_edges, length=F7_SIZE)


solid = f1.part
